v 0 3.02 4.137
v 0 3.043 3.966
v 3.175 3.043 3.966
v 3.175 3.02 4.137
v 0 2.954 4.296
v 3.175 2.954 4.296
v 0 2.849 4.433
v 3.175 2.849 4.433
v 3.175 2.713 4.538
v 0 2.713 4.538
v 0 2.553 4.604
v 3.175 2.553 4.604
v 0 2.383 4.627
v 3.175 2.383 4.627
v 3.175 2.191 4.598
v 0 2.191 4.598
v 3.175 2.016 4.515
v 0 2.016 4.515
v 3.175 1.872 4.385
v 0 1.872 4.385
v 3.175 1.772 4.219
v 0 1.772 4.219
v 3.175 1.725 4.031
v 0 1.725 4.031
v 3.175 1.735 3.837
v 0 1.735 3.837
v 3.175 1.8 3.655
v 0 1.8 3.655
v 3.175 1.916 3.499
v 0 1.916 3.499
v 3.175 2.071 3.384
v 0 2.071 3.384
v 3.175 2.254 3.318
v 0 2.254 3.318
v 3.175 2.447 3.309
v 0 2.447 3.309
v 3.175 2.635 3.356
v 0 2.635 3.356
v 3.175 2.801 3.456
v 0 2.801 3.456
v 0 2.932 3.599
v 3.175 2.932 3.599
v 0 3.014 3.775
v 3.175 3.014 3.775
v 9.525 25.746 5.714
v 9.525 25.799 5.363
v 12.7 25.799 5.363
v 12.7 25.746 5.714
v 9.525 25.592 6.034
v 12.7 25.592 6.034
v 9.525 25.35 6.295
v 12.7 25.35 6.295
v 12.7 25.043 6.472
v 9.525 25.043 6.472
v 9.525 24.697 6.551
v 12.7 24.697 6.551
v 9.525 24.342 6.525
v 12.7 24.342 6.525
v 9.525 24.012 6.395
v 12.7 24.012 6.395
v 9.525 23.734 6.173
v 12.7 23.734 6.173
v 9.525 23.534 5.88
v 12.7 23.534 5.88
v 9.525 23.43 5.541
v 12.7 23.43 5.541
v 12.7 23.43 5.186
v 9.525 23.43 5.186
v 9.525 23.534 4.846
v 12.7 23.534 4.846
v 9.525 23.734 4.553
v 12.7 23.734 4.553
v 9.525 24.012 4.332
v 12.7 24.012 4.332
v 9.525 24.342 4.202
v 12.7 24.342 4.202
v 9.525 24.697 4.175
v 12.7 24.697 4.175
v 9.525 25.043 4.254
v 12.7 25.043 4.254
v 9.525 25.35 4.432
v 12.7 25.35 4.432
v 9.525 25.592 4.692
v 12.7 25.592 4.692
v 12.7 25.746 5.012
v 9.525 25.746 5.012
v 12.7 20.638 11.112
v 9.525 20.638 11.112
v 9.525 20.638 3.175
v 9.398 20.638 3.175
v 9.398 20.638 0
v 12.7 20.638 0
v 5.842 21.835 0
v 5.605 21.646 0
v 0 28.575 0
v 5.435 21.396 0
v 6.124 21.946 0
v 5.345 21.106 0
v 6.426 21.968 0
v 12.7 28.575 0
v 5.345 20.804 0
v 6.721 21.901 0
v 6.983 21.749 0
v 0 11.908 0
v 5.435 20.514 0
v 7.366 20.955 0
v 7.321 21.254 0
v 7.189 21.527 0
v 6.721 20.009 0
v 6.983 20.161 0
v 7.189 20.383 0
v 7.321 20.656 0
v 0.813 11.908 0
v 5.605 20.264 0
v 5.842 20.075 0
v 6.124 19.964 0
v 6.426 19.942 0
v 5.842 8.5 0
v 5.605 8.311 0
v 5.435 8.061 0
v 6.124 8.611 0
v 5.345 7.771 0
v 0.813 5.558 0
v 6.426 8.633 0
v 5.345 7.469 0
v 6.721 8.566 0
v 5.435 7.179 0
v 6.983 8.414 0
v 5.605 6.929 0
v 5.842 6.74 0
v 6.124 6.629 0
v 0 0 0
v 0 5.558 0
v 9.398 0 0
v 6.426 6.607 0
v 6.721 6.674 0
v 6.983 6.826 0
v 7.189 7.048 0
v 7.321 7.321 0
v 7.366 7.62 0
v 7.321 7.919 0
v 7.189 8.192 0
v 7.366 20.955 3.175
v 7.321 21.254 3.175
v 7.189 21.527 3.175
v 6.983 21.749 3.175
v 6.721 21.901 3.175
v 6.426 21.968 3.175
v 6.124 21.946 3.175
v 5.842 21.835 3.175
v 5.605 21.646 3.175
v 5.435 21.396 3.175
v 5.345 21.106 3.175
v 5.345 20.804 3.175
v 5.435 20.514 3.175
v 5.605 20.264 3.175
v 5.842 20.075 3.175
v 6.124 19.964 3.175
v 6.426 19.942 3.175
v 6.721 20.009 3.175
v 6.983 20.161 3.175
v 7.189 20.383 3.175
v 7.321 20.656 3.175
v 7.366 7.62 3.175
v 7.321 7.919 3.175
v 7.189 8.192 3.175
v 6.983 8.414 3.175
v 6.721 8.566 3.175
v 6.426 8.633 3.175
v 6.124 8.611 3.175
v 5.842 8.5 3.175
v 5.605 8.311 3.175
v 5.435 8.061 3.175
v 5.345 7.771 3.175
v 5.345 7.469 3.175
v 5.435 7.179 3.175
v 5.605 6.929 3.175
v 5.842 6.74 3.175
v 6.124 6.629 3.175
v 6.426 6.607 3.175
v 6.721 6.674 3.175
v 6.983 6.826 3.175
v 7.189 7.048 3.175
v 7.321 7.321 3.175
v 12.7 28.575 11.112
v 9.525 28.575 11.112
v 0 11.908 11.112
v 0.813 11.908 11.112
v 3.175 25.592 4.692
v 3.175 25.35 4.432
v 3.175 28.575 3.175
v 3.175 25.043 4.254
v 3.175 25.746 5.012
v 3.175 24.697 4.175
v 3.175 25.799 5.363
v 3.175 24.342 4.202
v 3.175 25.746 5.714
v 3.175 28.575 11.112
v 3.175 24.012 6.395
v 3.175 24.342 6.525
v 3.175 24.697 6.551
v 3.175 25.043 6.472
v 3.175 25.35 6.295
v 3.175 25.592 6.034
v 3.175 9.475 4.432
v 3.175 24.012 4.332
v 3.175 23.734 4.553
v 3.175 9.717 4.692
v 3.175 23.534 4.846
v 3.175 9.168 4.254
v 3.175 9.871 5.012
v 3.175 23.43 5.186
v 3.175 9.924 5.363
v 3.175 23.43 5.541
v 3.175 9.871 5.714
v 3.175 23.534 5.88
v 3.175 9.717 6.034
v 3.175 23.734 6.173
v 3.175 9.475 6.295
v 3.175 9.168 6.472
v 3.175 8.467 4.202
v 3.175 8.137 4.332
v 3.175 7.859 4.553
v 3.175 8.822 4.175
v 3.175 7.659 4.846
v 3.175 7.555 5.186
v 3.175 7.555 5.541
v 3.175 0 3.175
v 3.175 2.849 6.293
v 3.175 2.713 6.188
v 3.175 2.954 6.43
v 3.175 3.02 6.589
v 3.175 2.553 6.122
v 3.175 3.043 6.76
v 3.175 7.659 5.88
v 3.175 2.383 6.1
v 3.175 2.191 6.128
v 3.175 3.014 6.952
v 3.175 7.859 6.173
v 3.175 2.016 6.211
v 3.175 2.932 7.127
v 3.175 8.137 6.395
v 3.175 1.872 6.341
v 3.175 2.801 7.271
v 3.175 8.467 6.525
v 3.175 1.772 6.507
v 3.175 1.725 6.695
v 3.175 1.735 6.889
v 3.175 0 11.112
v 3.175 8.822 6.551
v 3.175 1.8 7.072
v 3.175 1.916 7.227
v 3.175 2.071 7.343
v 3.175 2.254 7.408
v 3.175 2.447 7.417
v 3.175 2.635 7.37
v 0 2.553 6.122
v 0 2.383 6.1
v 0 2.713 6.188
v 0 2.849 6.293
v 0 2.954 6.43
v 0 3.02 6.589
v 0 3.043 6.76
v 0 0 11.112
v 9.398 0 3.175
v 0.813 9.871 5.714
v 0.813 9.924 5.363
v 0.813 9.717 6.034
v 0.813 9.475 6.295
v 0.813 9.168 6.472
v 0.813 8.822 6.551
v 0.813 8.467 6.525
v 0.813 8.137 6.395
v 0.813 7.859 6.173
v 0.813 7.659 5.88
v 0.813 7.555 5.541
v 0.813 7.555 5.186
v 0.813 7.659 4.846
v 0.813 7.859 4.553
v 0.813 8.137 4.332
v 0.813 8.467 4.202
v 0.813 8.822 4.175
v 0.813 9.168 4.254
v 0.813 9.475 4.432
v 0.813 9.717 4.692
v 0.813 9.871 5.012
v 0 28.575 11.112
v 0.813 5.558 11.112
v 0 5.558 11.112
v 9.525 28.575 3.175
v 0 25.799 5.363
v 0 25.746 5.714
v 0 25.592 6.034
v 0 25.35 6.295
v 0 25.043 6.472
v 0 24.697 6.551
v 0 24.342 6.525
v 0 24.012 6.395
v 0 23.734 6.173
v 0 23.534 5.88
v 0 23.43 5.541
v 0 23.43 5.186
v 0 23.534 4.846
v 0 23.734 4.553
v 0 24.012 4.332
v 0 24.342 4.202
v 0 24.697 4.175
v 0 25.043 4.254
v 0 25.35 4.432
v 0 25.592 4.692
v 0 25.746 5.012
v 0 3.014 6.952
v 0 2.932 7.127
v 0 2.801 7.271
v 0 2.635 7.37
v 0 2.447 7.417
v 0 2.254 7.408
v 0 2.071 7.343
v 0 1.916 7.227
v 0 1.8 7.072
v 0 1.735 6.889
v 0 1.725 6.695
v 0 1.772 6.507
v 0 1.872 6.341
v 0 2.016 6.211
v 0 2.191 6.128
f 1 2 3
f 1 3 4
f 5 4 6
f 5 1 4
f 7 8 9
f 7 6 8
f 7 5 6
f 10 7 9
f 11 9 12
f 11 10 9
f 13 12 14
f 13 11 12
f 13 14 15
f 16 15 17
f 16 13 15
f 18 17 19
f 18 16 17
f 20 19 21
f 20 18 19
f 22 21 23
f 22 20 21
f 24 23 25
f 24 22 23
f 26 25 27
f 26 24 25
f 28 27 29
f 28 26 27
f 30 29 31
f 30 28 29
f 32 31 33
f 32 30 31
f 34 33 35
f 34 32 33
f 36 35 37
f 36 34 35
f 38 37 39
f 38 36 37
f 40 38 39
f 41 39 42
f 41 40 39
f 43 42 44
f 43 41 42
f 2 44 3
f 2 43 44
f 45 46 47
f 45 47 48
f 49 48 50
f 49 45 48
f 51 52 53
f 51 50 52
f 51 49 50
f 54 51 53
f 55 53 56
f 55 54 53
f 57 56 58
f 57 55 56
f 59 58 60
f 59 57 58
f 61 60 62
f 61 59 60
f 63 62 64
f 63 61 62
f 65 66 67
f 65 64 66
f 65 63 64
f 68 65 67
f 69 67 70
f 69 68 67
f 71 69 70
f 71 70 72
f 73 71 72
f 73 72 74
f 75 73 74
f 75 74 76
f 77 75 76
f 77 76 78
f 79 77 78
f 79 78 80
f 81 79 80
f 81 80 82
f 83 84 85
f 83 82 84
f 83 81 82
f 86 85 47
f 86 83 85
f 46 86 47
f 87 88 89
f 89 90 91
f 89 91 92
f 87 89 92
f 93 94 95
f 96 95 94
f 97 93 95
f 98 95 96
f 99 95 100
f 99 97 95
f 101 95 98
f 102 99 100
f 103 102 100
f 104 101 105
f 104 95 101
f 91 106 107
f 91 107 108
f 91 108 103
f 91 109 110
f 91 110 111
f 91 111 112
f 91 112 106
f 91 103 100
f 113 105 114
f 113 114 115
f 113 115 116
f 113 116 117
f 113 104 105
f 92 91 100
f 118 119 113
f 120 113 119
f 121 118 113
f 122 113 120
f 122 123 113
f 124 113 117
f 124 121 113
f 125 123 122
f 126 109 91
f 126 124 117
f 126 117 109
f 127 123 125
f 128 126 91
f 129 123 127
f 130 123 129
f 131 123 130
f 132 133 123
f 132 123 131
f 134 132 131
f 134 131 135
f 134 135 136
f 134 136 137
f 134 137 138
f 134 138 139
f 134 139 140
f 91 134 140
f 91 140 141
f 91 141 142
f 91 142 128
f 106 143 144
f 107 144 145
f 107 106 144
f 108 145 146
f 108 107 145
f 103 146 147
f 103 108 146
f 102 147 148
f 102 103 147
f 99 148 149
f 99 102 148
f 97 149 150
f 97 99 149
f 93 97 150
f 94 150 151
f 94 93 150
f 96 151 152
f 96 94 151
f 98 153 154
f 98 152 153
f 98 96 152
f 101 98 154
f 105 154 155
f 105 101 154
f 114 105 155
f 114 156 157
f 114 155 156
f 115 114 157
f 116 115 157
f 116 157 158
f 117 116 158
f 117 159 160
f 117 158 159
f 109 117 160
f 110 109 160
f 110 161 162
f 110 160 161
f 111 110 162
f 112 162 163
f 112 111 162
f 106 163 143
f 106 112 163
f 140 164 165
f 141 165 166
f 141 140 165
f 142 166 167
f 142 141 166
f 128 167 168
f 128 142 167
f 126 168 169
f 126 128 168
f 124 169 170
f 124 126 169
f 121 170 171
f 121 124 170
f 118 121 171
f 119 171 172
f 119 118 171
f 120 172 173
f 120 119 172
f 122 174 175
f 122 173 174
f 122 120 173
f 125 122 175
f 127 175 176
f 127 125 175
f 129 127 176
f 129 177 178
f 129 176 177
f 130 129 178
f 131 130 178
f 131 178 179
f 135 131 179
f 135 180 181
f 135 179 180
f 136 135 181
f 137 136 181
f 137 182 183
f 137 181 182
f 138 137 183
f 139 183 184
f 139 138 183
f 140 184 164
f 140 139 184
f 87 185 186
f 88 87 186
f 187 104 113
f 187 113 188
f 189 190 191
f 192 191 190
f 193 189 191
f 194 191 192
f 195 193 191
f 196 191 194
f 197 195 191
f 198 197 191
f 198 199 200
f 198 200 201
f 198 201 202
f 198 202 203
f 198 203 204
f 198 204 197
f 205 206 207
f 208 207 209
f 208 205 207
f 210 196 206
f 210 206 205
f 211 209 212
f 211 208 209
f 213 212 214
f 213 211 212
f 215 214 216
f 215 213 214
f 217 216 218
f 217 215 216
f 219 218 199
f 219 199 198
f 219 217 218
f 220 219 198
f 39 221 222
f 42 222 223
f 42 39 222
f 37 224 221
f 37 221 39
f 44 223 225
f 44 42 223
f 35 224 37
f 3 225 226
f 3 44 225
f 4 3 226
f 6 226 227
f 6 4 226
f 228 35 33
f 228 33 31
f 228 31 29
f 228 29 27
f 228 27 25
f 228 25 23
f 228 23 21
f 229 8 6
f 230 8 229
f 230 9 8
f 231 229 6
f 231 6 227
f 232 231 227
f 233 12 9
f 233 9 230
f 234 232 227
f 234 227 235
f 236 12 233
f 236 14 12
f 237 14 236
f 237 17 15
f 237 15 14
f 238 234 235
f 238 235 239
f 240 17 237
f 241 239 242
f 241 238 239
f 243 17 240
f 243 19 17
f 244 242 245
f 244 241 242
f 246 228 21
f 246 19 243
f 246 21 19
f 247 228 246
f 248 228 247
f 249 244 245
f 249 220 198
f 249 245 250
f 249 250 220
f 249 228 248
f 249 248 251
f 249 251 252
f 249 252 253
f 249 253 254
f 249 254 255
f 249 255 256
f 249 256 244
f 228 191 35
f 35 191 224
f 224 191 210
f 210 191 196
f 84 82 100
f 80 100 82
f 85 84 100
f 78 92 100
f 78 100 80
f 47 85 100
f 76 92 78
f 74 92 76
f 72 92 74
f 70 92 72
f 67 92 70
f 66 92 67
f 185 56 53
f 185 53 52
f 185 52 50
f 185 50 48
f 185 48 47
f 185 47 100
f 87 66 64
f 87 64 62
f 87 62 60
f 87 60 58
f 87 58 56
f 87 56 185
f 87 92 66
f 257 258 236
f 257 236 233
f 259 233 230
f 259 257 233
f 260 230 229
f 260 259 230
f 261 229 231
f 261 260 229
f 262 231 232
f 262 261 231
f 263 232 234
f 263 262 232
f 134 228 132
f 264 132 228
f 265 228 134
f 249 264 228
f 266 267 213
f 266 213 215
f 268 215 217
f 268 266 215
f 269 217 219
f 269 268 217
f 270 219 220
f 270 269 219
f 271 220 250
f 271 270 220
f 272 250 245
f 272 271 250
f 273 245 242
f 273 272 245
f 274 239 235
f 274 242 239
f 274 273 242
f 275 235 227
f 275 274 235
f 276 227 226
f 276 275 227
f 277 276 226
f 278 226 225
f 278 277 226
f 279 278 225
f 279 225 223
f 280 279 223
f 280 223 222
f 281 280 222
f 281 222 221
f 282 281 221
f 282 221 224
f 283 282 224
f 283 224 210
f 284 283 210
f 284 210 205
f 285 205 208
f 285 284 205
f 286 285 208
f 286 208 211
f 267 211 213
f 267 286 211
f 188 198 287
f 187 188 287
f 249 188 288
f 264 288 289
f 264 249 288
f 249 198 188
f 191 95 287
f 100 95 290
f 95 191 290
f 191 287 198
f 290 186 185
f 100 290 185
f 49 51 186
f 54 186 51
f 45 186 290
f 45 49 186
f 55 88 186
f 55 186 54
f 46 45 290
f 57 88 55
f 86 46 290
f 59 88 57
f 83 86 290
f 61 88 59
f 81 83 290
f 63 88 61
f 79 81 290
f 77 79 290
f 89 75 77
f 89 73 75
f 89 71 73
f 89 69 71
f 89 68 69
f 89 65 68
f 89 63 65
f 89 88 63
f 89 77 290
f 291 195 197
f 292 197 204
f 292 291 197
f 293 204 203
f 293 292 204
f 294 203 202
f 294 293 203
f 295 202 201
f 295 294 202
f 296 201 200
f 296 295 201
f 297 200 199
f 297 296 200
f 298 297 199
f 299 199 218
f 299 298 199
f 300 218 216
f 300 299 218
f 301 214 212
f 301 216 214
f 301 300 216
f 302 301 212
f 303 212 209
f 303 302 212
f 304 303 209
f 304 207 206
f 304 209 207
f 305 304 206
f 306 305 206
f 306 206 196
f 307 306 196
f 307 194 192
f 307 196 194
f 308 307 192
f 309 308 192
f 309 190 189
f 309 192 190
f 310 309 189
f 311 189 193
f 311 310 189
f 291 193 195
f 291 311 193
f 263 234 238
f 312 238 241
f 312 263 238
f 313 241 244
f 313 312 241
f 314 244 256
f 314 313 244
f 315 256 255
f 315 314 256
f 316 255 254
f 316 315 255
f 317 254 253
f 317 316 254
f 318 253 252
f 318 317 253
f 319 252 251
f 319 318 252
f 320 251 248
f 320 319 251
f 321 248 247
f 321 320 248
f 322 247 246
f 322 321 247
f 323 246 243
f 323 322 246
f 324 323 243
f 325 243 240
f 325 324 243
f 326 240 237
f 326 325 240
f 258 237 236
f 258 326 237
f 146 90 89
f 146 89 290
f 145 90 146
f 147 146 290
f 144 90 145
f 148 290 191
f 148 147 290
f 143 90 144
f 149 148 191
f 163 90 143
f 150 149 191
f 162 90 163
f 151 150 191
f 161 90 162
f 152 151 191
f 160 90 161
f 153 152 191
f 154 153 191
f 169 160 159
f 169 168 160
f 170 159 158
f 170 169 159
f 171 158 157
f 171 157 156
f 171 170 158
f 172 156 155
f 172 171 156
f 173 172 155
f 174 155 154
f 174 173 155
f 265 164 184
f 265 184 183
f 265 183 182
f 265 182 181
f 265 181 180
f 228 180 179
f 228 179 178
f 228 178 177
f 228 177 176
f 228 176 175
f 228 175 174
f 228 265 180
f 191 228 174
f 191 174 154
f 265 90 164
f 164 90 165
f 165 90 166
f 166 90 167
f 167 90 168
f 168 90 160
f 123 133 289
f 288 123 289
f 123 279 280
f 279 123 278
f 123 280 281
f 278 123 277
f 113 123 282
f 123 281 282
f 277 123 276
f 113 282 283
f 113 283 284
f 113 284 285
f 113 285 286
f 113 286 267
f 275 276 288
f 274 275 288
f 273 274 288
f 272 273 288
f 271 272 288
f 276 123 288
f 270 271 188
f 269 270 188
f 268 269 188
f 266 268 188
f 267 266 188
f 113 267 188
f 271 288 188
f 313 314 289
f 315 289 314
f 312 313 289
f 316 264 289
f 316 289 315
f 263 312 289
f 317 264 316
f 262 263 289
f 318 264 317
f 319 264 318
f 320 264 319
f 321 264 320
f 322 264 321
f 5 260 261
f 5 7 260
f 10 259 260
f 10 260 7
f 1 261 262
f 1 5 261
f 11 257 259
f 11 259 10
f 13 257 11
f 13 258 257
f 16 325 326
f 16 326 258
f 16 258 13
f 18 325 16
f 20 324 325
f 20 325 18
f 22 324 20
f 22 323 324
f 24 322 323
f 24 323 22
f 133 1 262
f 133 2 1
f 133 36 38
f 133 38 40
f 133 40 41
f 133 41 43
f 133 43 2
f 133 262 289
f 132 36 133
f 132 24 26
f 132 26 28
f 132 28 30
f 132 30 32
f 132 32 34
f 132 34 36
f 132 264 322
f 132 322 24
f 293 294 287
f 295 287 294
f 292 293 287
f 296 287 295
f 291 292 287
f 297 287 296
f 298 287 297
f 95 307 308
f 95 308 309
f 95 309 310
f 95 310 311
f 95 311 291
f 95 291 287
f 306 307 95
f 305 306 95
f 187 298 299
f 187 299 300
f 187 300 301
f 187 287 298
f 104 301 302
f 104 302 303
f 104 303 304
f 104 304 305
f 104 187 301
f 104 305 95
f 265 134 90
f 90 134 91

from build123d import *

# Parameters (mm, degrees)
F1_DEPTH      = 28.575
F2_W          = 12.7
F2_H          = 38.1
F3_DEPTH      = 25.4
F3_DEPTH_BACK = 25.4
F4_R          = 1.19126
F5_DEPTH      = 25.4
F5_DEPTH_BACK = 25.4
F6_W          = 6.35
F6_H          = 25.4
F7_DEPTH      = 0.8128
F8_R          = 1.016
F9_DEPTH      = 25.4
F9_DEPTH_BACK = 25.4


with BuildPart() as f1:
    # F0 (on Front) → F1 (new body)
    with BuildSketch(Plane.XZ):
        Polygon((0, 11.1125), (0, 0), (12.7, 0), (12.7, 11.1125), (9.525, 11.1125), (9.525, 3.175), (3.175, 3.175), (3.175, 11.1125), align=None)
    extrude(amount=-F1_DEPTH)

    # F2 (on Top) → F3 (cut, two sides)
    with BuildSketch(Plane.XY) as f3_sk:
        with Locations((15.748, 1.5875)):
            Rectangle(F2_W, F2_H)
    extrude(amount=F3_DEPTH, mode=Mode.SUBTRACT)
    extrude(f3_sk.sketch, amount=-F3_DEPTH_BACK, mode=Mode.SUBTRACT)

    # F4 (on Right) → F5 (cut, two sides)
    with BuildSketch(Plane.YZ) as f5_sk:
        with Locations((8.73252, 5.36321)):
            Circle(F4_R)
        with Locations((24.60752, 5.36321)):
            Circle(F4_R)
        with BuildLine():
            ThreePointArc((2.38252, 4.62661), (1.9155466817, 3.4992366817), (3.04292, 3.96621))
            ThreePointArc((3.04292, 3.96621), (2.8494933183, 4.4331833183), (2.38252, 4.62661))
        make_face()
        with BuildLine():
            ThreePointArc((3.04292, 6.76021), (1.9155466817, 7.2271833183), (2.38252, 6.09981))
            ThreePointArc((2.38252, 6.09981), (2.8494933183, 6.2932366817), (3.04292, 6.76021))
        make_face()
    extrude(amount=F5_DEPTH, mode=Mode.SUBTRACT)
    extrude(f5_sk.sketch, amount=-F5_DEPTH_BACK, mode=Mode.SUBTRACT)

    # F6 (on Right) → F7 (cut)
    with BuildSketch(Plane.YZ):
        with Locations((8.73252, 10.0369287327)):
            Rectangle(F6_W, F6_H)
    extrude(amount=F7_DEPTH, mode=Mode.SUBTRACT)

    # F8 (on Top) → F9 (cut, two sides)
    with BuildSketch(Plane.XY) as f9_sk:
        with Locations((6.35, 20.955)):
            Circle(F8_R)
        with Locations((6.35, 7.62)):
            Circle(F8_R)
    extrude(amount=-F9_DEPTH, mode=Mode.SUBTRACT)
    extrude(f9_sk.sketch, amount=F9_DEPTH_BACK, mode=Mode.SUBTRACT)


solid = f1.part
